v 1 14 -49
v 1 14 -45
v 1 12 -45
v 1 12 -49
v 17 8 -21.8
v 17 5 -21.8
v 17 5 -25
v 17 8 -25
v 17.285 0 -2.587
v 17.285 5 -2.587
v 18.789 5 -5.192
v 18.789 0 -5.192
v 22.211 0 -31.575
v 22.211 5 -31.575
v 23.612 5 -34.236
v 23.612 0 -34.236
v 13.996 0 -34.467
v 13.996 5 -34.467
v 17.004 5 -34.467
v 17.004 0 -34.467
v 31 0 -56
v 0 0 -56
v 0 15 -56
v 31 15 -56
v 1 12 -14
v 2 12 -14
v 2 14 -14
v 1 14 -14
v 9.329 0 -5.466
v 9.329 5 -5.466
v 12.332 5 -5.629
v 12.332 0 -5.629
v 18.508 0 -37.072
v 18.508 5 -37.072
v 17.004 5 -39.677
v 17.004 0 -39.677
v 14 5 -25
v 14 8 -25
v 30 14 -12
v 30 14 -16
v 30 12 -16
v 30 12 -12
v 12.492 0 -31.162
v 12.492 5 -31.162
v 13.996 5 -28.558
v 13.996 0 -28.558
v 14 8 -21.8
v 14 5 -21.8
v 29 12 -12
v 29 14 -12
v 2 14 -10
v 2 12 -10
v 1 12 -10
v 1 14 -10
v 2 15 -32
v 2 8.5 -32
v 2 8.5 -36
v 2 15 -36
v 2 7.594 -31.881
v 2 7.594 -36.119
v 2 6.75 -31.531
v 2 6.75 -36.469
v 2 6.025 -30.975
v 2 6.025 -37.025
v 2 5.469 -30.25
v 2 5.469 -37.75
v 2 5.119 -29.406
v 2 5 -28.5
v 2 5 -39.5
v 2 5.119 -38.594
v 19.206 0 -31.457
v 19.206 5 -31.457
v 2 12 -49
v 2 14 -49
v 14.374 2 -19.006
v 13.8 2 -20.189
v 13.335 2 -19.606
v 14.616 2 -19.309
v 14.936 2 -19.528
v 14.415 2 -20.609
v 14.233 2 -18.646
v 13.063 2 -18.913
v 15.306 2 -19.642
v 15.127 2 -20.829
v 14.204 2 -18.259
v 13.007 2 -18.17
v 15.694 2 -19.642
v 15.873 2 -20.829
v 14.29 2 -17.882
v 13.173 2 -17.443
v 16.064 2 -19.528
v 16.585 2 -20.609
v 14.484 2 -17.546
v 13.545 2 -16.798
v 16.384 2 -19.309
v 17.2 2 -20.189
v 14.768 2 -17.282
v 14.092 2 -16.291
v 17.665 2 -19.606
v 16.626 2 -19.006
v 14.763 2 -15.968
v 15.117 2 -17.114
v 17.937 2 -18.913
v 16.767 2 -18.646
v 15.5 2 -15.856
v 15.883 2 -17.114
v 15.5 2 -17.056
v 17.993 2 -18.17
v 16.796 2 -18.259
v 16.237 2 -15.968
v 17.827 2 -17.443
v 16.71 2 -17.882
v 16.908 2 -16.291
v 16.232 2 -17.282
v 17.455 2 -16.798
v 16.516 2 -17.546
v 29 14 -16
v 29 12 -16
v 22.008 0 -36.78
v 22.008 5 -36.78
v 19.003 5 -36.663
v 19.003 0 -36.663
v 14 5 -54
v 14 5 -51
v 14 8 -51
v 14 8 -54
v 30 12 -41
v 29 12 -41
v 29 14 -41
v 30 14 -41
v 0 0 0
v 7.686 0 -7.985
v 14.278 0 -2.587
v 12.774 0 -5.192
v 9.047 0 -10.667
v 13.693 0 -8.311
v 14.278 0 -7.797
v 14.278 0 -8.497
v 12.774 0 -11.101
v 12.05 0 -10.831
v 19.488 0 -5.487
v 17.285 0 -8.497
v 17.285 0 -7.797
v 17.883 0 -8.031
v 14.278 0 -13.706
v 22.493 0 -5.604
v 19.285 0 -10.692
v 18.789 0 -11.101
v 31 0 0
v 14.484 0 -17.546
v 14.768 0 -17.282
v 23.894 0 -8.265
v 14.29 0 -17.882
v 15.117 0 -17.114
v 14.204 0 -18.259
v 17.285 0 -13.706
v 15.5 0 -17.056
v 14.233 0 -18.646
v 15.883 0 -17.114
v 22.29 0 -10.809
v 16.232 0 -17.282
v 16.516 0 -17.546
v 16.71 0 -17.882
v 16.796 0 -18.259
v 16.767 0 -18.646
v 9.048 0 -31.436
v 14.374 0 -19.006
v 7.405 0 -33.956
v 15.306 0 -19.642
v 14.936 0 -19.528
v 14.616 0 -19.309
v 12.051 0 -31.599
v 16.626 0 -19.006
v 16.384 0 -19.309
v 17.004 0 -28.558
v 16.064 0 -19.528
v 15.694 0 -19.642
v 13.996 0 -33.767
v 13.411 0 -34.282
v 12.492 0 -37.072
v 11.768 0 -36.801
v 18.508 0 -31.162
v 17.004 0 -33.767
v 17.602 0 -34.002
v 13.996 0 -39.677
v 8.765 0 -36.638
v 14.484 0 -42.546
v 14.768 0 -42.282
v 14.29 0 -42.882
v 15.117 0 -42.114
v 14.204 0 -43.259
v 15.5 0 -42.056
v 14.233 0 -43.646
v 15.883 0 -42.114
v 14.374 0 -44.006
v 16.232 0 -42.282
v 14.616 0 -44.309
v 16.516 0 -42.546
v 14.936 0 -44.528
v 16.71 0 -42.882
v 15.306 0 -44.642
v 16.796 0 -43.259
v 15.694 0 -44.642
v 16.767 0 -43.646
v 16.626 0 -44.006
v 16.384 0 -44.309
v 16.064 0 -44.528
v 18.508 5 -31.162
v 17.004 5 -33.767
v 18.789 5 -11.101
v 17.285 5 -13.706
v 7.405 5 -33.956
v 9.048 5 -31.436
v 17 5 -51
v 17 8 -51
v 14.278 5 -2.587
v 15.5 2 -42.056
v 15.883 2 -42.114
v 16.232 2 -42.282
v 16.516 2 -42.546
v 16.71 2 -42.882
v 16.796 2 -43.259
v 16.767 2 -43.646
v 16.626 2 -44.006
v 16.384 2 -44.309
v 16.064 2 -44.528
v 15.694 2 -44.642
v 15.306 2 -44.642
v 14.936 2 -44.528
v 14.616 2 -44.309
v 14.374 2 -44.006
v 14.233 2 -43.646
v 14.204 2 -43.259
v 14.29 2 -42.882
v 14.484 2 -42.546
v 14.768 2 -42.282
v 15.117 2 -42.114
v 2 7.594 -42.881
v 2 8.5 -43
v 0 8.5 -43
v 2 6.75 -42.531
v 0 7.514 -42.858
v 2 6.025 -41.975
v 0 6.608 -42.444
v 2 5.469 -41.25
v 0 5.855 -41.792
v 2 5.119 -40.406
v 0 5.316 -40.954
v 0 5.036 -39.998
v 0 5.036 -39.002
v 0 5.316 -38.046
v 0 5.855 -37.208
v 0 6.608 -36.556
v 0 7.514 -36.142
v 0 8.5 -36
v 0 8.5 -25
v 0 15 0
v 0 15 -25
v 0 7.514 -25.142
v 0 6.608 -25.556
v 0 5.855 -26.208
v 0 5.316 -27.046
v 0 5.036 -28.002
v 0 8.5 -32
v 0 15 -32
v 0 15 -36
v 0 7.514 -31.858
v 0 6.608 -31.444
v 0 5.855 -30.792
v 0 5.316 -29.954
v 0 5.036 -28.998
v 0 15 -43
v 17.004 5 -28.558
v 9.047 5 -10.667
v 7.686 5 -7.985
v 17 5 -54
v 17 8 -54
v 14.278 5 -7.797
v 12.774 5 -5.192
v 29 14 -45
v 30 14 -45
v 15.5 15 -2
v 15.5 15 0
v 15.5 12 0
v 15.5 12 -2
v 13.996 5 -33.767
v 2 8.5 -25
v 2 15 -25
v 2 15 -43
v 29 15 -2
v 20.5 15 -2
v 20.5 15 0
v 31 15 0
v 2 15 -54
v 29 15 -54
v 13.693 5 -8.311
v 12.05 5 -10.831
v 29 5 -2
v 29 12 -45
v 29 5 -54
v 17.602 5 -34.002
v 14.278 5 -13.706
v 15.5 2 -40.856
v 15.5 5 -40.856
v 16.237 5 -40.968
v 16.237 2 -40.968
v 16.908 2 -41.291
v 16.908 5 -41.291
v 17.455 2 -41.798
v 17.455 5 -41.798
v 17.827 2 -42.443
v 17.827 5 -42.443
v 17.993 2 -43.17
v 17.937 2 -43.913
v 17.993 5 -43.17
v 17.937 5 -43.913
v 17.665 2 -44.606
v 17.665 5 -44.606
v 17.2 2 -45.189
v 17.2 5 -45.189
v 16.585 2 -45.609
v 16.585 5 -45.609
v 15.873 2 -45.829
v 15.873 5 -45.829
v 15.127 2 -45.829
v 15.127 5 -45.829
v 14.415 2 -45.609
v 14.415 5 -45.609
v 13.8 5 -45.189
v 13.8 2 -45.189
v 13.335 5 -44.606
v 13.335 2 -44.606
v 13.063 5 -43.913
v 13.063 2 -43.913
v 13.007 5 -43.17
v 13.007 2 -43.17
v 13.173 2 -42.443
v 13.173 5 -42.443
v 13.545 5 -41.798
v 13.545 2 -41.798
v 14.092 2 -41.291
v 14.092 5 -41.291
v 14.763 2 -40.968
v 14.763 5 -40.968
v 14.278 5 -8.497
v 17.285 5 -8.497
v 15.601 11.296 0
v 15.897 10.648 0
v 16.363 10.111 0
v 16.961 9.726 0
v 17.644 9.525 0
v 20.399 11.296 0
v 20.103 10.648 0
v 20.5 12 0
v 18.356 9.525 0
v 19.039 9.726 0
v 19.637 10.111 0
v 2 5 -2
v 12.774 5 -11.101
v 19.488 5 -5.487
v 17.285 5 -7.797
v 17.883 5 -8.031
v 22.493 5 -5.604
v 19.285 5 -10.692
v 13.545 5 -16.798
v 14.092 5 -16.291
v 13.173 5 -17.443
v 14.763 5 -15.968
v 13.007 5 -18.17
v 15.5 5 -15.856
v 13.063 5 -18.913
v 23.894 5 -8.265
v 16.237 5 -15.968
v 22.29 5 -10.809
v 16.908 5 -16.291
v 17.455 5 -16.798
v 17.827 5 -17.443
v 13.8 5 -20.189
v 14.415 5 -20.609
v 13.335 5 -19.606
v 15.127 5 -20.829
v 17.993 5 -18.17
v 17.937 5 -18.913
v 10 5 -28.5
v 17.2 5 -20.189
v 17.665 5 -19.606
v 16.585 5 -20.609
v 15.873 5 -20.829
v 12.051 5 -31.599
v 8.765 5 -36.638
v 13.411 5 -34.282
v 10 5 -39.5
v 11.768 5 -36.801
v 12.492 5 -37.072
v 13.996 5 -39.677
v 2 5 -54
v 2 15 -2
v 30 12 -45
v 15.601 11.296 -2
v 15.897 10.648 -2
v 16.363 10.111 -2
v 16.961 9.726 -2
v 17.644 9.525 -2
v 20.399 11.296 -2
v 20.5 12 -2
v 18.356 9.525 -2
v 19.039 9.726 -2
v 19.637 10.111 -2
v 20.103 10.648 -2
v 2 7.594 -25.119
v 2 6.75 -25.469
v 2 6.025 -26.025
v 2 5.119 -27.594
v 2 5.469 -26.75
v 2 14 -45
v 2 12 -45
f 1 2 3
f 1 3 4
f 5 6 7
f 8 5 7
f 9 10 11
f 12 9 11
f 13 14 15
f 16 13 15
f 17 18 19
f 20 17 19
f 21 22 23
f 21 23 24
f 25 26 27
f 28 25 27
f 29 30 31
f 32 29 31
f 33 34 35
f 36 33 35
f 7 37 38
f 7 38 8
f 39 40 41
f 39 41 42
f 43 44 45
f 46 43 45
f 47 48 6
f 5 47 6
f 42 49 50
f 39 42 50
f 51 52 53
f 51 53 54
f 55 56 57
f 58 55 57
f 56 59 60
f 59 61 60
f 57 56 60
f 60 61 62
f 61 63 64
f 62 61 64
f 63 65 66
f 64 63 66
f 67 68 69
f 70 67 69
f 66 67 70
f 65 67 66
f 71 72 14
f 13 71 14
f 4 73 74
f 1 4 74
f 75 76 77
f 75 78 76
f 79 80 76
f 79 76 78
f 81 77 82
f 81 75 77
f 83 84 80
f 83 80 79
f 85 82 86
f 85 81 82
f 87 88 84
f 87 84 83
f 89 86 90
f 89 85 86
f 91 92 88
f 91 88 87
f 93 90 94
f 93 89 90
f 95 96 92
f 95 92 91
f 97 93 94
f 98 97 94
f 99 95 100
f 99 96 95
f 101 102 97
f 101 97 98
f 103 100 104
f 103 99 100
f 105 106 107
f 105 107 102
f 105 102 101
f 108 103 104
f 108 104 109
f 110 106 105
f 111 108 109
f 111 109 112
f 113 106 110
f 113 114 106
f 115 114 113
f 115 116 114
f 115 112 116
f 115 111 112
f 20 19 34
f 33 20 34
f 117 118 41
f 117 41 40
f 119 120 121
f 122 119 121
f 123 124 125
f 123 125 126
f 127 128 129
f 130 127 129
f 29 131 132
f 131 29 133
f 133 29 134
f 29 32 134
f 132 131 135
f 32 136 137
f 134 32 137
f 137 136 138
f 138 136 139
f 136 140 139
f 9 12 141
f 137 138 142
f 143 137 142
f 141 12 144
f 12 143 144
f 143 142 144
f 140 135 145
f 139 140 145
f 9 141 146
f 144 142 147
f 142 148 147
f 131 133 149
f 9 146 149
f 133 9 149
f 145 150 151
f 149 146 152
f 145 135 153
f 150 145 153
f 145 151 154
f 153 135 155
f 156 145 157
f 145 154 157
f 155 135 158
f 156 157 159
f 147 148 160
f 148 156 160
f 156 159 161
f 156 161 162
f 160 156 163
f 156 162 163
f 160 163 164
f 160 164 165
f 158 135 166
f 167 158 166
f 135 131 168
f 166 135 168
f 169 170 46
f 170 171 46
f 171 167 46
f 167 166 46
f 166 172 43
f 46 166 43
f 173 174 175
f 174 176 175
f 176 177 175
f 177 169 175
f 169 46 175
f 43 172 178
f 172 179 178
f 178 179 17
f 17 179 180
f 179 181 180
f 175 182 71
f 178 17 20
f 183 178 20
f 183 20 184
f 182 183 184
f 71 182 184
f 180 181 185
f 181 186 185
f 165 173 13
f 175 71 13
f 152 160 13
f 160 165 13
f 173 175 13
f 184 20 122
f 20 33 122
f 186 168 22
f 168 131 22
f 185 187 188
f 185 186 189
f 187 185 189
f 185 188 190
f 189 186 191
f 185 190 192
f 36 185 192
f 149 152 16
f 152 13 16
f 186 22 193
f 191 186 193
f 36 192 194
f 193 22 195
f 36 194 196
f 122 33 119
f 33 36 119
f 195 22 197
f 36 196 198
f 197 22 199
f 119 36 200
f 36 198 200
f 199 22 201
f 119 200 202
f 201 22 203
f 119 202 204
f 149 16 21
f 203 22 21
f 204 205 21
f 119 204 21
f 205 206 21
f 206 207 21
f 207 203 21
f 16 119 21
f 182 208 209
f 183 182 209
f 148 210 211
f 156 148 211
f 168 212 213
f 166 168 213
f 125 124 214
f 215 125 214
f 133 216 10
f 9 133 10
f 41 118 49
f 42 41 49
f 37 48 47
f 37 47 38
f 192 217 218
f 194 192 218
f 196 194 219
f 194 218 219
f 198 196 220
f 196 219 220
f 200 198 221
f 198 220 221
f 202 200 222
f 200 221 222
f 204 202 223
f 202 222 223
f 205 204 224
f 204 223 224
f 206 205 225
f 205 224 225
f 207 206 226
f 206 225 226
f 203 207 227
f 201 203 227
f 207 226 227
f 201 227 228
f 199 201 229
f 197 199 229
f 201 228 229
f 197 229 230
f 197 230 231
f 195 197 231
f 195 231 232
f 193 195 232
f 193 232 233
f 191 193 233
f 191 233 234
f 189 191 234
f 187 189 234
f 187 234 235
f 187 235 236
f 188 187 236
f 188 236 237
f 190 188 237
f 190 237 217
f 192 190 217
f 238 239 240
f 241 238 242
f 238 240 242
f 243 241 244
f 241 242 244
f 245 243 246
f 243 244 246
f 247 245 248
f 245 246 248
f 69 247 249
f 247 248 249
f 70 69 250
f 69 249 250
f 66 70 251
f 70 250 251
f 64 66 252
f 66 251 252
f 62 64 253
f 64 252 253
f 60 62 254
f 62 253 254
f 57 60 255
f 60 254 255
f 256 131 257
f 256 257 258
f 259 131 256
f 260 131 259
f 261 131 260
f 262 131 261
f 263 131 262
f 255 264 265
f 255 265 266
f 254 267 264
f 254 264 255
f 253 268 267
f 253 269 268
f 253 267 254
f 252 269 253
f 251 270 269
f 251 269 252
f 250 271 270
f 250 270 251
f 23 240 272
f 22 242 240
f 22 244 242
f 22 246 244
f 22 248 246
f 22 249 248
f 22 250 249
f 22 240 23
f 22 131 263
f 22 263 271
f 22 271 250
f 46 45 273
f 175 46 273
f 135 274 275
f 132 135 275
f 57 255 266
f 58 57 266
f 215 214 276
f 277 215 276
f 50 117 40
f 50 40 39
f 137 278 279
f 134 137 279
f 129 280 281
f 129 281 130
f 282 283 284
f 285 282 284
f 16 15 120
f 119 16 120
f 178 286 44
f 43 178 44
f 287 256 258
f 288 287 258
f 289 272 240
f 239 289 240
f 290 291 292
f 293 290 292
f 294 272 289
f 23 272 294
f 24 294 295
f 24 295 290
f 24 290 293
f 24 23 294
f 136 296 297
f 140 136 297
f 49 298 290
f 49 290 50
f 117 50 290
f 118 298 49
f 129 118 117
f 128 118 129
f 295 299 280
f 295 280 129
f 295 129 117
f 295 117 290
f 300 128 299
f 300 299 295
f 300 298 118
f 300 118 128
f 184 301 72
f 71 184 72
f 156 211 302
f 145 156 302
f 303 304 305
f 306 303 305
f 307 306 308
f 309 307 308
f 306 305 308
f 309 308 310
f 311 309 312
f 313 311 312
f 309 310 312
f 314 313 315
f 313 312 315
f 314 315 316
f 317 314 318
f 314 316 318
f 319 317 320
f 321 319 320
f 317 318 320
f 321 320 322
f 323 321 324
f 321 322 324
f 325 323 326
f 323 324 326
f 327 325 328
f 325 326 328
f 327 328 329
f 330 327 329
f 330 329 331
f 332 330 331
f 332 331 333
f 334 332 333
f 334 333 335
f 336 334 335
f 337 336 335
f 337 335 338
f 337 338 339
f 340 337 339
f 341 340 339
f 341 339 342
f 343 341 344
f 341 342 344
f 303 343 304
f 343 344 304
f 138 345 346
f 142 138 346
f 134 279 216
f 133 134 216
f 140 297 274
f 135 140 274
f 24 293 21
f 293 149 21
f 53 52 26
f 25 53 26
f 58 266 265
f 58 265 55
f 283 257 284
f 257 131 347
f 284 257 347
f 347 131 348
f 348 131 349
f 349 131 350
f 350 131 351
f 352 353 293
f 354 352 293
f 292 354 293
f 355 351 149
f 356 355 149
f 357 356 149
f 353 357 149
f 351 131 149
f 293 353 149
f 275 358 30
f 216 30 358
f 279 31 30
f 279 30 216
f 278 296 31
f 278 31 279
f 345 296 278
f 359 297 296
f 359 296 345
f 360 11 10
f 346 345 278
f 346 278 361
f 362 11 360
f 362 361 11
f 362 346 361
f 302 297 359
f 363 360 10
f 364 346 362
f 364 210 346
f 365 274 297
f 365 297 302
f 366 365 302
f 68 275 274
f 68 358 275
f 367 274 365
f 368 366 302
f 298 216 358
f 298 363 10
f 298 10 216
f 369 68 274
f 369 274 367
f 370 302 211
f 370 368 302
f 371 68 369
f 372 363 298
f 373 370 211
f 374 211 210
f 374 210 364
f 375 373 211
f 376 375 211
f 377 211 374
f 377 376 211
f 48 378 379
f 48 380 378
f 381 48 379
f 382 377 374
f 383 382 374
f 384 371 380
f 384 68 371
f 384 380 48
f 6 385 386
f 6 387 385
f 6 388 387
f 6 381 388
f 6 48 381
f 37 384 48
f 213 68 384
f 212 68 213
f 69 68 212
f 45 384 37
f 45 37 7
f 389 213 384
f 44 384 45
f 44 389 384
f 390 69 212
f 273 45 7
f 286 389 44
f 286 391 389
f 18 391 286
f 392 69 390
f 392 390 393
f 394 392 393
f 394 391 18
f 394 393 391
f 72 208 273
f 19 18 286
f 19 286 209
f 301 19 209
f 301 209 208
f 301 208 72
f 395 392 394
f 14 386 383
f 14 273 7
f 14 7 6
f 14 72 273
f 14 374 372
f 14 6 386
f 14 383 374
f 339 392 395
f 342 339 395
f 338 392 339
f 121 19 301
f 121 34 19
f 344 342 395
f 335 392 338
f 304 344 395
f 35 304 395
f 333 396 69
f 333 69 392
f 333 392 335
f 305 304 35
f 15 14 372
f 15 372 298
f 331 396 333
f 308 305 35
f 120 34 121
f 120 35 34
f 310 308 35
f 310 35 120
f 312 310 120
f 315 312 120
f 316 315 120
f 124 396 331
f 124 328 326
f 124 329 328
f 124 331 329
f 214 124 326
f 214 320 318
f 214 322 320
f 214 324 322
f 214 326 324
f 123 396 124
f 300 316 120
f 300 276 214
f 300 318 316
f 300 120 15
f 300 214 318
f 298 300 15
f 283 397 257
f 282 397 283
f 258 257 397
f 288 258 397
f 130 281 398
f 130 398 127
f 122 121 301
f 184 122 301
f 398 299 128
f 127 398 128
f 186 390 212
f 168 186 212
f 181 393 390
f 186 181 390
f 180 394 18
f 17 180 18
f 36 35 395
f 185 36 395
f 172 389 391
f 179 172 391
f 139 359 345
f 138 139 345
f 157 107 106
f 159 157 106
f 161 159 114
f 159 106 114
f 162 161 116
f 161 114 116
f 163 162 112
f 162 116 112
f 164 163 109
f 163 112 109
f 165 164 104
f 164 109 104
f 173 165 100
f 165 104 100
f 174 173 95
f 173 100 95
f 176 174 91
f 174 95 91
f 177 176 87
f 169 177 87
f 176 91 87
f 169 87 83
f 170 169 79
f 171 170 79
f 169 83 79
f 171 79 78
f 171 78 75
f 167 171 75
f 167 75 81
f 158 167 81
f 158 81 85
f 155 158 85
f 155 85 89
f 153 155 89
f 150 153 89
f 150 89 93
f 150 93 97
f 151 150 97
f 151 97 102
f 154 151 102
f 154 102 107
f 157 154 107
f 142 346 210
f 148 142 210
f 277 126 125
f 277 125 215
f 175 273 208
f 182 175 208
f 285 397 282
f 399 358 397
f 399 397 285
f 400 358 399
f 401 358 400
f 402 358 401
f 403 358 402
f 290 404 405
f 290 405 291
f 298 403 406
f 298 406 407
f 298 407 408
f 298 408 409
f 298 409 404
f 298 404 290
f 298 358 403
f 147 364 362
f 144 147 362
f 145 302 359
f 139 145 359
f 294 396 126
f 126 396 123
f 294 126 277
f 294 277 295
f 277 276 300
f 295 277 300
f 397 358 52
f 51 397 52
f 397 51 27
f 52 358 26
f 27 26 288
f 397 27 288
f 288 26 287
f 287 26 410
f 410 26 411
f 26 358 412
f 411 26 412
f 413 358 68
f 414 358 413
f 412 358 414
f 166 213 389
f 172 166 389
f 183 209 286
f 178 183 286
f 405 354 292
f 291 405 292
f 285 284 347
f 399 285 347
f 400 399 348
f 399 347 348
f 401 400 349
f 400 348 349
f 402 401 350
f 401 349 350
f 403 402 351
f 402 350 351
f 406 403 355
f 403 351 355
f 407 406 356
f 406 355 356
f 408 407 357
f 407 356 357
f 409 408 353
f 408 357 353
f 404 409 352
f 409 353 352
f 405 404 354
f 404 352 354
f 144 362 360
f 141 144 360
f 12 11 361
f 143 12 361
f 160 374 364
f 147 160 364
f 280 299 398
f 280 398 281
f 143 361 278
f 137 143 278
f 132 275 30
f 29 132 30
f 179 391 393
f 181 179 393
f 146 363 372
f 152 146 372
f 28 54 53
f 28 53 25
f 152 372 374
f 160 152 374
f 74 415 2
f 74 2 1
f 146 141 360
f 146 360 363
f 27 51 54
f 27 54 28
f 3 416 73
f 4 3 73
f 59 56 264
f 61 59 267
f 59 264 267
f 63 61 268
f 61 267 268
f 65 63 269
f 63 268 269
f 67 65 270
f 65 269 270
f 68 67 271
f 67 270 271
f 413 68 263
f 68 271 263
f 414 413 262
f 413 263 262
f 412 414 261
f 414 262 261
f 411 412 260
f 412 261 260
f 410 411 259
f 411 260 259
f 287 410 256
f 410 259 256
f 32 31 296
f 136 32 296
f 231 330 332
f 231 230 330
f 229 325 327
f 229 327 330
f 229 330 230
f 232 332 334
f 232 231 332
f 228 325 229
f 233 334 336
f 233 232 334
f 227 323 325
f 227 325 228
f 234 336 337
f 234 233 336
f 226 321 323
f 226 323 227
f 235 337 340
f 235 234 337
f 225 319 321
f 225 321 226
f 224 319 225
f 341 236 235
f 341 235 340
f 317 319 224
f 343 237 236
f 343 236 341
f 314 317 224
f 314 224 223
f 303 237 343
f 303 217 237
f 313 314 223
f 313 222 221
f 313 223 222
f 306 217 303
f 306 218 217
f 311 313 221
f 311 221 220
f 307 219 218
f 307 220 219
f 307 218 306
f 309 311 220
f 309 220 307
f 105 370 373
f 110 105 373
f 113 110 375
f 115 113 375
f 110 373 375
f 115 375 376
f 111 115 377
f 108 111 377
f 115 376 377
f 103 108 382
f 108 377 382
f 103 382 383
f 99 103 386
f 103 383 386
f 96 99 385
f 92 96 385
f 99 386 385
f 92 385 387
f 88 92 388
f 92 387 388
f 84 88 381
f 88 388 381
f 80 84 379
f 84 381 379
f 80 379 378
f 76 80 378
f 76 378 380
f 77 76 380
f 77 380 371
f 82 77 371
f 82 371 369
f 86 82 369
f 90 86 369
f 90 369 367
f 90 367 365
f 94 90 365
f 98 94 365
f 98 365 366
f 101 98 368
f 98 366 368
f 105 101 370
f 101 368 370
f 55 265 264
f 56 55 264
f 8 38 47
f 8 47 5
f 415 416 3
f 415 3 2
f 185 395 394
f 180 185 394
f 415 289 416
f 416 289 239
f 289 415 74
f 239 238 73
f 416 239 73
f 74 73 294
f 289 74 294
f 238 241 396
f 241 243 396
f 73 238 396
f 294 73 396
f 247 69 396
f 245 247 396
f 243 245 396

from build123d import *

# Parameters (mm, degrees)
ESQUISSE1_W             = 31
ESQUISSE1_H             = 56
BOSS_EXTRU_1_DEPTH      = 5
ESQUISSE2_R             = 1.3
ENL_V_MAT_EXTRU_1_DEPTH = 65.202803677
ESQUISSE4_R             = 2.5
ENL_V_MAT_EXTRU_2_DEPTH = 3
ESQUISSE5_W             = 3
ESQUISSE5_H             = 3
ESQUISSE5_H_2           = 3.199702253
BOSS_EXTRU_2_DEPTH      = 3
ESQUISSE6_W             = 31
ESQUISSE6_H             = 56
ESQUISSE6_W_2           = 27
ESQUISSE6_H_2           = 52
BOSS_EXTRU_3_DEPTH      = 10
ENL_V_MAT_EXTRU_3_DEPTH = 10
ENL_V_MAT_EXTRU_4_DEPTH = 10
ESQUISSE10_W            = 4
ESQUISSE10_H            = 2
ENL_V_MAT_EXTRU_5_DEPTH = 1
ESQUISSE11_W            = 4
ESQUISSE11_H            = 2
ENL_V_MAT_EXTRU_6_DEPTH = 1


with BuildPart() as part:
    # Esquisse1 → Boss.-Extru.1 (new body)
    with BuildSketch(Plane(origin=(0, 0, 0), x_dir=(1, 0, 0), z_dir=(0, 1, 0))):
        with Locations((15.5, 28)):
            Rectangle(ESQUISSE1_W, ESQUISSE1_H)
    extrude(amount=BOSS_EXTRU_1_DEPTH)

    # Esquisse2 → Enlèv. mat.-Extru.1 (cut, through all)
    with BuildSketch(Plane(origin=(0, 5, 0), x_dir=(1, 0, 0), z_dir=(0, 1, 0))):
        with Locations(Location((15.5, 43.356492458, 0), (0, 0, 270))):
            Circle(ESQUISSE2_R)
        with Locations(Location((15.5, 18.356492458, 0), (0, 0, 270))):
            Circle(ESQUISSE2_R)
        Polygon((13.411017957, 34.281896818), (11.768091764, 36.801158467), (8.764884081, 36.637973473), (7.40460259, 33.955526829), (9.047528783, 31.43626518), (12.050736466, 31.599450174), align=None)
        Polygon((18.507637899, 37.071867086), (17.003818949, 39.676557912), (13.996181051, 39.676557912), (12.492362101, 37.071867086), (13.996181051, 34.46717626), (17.003818949, 34.46717626), align=None)
        Polygon((18.507637899, 31.162485434), (17.003818949, 33.76717626), (13.996181051, 33.76717626), (12.492362101, 31.162485434), (13.996181051, 28.557794609), (17.003818949, 28.557794609), align=None)
        Polygon((23.612406723, 34.235887688), (22.008252208, 36.780013083), (19.002897728, 36.662837218), (17.601697764, 34.001535959), (19.205852279, 31.457410565), (22.211206759, 31.574586429), align=None)
        Polygon((13.692694357, 8.311332727), (12.049768165, 10.830594377), (9.046560481, 10.667409382), (7.68627899, 7.984962739), (9.329205183, 5.465701089), (12.332412866, 5.628886084), align=None)
        Polygon((18.789314299, 11.101302996), (17.28549535, 13.705993821), (14.277857451, 13.705993821), (12.774038501, 11.101302996), (14.277857451, 8.49661217), (17.28549535, 8.49661217), align=None)
        Polygon((18.789314299, 5.191921344), (17.28549535, 7.79661217), (14.277857451, 7.79661217), (12.774038501, 5.191921344), (14.277857451, 2.587230518), (17.28549535, 2.587230518), align=None)
        Polygon((23.894083123, 8.265323598), (22.289928608, 10.809448992), (19.284574129, 10.692273128), (17.883374164, 8.030971869), (19.487528679, 5.486846474), (22.492883159, 5.604022339), align=None)
    extrude(amount=-ENL_V_MAT_EXTRU_1_DEPTH, mode=Mode.SUBTRACT)

    # Esquisse4 → Enlèv. mat.-Extru.2 (cut)
    with BuildSketch(Plane(origin=(0, 5, 0), x_dir=(1, 0, 0), z_dir=(0, 1, 0))):
        with Locations(Location((15.5, 43.356492458, 0), (0, 0, 270))):
            Circle(ESQUISSE4_R)
        with Locations(Location((15.5, 18.356492458, 0), (0, 0, 270))):
            Circle(ESQUISSE4_R)
    extrude(amount=-ENL_V_MAT_EXTRU_2_DEPTH, mode=Mode.SUBTRACT)

    # Esquisse5 → Boss.-Extru.2 (add)
    with BuildSketch(Plane(origin=(0, 5, 0), x_dir=(1, 0, 0), z_dir=(0, 1, 0))):
        with Locations((15.5, 52.5)):
            Rectangle(ESQUISSE5_W, ESQUISSE5_H)
        with Locations((15.5, 23.400148874)):
            Rectangle(ESQUISSE5_W, ESQUISSE5_H_2)
    extrude(amount=BOSS_EXTRU_2_DEPTH)

    # Esquisse6 → Boss.-Extru.3 (add)
    with BuildSketch(Plane(origin=(0, 5, 0), x_dir=(1, 0, 0), z_dir=(0, 1, 0))):
        with Locations((15.5, 28)):
            Rectangle(ESQUISSE6_W, ESQUISSE6_H)
        with Locations((15.5, 28)):
            Rectangle(ESQUISSE6_W_2, ESQUISSE6_H_2, mode=Mode.SUBTRACT)
    extrude(amount=BOSS_EXTRU_3_DEPTH)

    # Esquisse8 → Enlèv. mat.-Extru.3 (cut)
    with BuildSketch(Plane.ZY):
        with BuildLine():
            Line((-43, 15), (-43, 8.5))
            ThreePointArc((-43, 8.5), (-39.5, 5), (-36, 8.5))
            Line((-36, 8.5), (-36, 15))
            Line((-36, 15), (-43, 15))
        make_face()
        with BuildLine():
            Line((-32, 15), (-32, 8.5))
            ThreePointArc((-32, 8.5), (-28.5, 5), (-25, 8.5))
            Line((-25, 8.5), (-25, 15))
            Line((-25, 15), (-32, 15))
        make_face()
    extrude(amount=-ENL_V_MAT_EXTRU_3_DEPTH, mode=Mode.SUBTRACT)

    # Esquisse9 → Enlèv. mat.-Extru.4 (cut)
    with BuildSketch(Plane.XY):
        with BuildLine():
            Line((15.5, 15), (15.5, 12))
            ThreePointArc((15.5, 12), (18, 9.5), (20.5, 12))
            Line((20.5, 12), (20.5, 15))
            Line((20.5, 15), (15.5, 15))
        make_face()
    extrude(amount=-ENL_V_MAT_EXTRU_4_DEPTH, mode=Mode.SUBTRACT)

    # Esquisse10 → Enlèv. mat.-Extru.5 (cut)
    with BuildSketch(Plane.ZY.offset(-29)):
        with Locations((-43, 13)):
            Rectangle(ESQUISSE10_W, ESQUISSE10_H)
        with Locations((-14, 13)):
            Rectangle(ESQUISSE10_W, ESQUISSE10_H)
    extrude(amount=-ENL_V_MAT_EXTRU_5_DEPTH, mode=Mode.SUBTRACT)

    # Esquisse11 → Enlèv. mat.-Extru.6 (cut)
    with BuildSketch(Plane(origin=(2, 0, 0), x_dir=(0, 0, -1), z_dir=(1, 0, 0))):
        with Locations((12, 13)):
            Rectangle(ESQUISSE11_W, ESQUISSE11_H)
        with Locations((47, 13)):
            Rectangle(ESQUISSE11_W, ESQUISSE11_H)
    extrude(amount=-ENL_V_MAT_EXTRU_6_DEPTH, mode=Mode.SUBTRACT)


solid = part.part
